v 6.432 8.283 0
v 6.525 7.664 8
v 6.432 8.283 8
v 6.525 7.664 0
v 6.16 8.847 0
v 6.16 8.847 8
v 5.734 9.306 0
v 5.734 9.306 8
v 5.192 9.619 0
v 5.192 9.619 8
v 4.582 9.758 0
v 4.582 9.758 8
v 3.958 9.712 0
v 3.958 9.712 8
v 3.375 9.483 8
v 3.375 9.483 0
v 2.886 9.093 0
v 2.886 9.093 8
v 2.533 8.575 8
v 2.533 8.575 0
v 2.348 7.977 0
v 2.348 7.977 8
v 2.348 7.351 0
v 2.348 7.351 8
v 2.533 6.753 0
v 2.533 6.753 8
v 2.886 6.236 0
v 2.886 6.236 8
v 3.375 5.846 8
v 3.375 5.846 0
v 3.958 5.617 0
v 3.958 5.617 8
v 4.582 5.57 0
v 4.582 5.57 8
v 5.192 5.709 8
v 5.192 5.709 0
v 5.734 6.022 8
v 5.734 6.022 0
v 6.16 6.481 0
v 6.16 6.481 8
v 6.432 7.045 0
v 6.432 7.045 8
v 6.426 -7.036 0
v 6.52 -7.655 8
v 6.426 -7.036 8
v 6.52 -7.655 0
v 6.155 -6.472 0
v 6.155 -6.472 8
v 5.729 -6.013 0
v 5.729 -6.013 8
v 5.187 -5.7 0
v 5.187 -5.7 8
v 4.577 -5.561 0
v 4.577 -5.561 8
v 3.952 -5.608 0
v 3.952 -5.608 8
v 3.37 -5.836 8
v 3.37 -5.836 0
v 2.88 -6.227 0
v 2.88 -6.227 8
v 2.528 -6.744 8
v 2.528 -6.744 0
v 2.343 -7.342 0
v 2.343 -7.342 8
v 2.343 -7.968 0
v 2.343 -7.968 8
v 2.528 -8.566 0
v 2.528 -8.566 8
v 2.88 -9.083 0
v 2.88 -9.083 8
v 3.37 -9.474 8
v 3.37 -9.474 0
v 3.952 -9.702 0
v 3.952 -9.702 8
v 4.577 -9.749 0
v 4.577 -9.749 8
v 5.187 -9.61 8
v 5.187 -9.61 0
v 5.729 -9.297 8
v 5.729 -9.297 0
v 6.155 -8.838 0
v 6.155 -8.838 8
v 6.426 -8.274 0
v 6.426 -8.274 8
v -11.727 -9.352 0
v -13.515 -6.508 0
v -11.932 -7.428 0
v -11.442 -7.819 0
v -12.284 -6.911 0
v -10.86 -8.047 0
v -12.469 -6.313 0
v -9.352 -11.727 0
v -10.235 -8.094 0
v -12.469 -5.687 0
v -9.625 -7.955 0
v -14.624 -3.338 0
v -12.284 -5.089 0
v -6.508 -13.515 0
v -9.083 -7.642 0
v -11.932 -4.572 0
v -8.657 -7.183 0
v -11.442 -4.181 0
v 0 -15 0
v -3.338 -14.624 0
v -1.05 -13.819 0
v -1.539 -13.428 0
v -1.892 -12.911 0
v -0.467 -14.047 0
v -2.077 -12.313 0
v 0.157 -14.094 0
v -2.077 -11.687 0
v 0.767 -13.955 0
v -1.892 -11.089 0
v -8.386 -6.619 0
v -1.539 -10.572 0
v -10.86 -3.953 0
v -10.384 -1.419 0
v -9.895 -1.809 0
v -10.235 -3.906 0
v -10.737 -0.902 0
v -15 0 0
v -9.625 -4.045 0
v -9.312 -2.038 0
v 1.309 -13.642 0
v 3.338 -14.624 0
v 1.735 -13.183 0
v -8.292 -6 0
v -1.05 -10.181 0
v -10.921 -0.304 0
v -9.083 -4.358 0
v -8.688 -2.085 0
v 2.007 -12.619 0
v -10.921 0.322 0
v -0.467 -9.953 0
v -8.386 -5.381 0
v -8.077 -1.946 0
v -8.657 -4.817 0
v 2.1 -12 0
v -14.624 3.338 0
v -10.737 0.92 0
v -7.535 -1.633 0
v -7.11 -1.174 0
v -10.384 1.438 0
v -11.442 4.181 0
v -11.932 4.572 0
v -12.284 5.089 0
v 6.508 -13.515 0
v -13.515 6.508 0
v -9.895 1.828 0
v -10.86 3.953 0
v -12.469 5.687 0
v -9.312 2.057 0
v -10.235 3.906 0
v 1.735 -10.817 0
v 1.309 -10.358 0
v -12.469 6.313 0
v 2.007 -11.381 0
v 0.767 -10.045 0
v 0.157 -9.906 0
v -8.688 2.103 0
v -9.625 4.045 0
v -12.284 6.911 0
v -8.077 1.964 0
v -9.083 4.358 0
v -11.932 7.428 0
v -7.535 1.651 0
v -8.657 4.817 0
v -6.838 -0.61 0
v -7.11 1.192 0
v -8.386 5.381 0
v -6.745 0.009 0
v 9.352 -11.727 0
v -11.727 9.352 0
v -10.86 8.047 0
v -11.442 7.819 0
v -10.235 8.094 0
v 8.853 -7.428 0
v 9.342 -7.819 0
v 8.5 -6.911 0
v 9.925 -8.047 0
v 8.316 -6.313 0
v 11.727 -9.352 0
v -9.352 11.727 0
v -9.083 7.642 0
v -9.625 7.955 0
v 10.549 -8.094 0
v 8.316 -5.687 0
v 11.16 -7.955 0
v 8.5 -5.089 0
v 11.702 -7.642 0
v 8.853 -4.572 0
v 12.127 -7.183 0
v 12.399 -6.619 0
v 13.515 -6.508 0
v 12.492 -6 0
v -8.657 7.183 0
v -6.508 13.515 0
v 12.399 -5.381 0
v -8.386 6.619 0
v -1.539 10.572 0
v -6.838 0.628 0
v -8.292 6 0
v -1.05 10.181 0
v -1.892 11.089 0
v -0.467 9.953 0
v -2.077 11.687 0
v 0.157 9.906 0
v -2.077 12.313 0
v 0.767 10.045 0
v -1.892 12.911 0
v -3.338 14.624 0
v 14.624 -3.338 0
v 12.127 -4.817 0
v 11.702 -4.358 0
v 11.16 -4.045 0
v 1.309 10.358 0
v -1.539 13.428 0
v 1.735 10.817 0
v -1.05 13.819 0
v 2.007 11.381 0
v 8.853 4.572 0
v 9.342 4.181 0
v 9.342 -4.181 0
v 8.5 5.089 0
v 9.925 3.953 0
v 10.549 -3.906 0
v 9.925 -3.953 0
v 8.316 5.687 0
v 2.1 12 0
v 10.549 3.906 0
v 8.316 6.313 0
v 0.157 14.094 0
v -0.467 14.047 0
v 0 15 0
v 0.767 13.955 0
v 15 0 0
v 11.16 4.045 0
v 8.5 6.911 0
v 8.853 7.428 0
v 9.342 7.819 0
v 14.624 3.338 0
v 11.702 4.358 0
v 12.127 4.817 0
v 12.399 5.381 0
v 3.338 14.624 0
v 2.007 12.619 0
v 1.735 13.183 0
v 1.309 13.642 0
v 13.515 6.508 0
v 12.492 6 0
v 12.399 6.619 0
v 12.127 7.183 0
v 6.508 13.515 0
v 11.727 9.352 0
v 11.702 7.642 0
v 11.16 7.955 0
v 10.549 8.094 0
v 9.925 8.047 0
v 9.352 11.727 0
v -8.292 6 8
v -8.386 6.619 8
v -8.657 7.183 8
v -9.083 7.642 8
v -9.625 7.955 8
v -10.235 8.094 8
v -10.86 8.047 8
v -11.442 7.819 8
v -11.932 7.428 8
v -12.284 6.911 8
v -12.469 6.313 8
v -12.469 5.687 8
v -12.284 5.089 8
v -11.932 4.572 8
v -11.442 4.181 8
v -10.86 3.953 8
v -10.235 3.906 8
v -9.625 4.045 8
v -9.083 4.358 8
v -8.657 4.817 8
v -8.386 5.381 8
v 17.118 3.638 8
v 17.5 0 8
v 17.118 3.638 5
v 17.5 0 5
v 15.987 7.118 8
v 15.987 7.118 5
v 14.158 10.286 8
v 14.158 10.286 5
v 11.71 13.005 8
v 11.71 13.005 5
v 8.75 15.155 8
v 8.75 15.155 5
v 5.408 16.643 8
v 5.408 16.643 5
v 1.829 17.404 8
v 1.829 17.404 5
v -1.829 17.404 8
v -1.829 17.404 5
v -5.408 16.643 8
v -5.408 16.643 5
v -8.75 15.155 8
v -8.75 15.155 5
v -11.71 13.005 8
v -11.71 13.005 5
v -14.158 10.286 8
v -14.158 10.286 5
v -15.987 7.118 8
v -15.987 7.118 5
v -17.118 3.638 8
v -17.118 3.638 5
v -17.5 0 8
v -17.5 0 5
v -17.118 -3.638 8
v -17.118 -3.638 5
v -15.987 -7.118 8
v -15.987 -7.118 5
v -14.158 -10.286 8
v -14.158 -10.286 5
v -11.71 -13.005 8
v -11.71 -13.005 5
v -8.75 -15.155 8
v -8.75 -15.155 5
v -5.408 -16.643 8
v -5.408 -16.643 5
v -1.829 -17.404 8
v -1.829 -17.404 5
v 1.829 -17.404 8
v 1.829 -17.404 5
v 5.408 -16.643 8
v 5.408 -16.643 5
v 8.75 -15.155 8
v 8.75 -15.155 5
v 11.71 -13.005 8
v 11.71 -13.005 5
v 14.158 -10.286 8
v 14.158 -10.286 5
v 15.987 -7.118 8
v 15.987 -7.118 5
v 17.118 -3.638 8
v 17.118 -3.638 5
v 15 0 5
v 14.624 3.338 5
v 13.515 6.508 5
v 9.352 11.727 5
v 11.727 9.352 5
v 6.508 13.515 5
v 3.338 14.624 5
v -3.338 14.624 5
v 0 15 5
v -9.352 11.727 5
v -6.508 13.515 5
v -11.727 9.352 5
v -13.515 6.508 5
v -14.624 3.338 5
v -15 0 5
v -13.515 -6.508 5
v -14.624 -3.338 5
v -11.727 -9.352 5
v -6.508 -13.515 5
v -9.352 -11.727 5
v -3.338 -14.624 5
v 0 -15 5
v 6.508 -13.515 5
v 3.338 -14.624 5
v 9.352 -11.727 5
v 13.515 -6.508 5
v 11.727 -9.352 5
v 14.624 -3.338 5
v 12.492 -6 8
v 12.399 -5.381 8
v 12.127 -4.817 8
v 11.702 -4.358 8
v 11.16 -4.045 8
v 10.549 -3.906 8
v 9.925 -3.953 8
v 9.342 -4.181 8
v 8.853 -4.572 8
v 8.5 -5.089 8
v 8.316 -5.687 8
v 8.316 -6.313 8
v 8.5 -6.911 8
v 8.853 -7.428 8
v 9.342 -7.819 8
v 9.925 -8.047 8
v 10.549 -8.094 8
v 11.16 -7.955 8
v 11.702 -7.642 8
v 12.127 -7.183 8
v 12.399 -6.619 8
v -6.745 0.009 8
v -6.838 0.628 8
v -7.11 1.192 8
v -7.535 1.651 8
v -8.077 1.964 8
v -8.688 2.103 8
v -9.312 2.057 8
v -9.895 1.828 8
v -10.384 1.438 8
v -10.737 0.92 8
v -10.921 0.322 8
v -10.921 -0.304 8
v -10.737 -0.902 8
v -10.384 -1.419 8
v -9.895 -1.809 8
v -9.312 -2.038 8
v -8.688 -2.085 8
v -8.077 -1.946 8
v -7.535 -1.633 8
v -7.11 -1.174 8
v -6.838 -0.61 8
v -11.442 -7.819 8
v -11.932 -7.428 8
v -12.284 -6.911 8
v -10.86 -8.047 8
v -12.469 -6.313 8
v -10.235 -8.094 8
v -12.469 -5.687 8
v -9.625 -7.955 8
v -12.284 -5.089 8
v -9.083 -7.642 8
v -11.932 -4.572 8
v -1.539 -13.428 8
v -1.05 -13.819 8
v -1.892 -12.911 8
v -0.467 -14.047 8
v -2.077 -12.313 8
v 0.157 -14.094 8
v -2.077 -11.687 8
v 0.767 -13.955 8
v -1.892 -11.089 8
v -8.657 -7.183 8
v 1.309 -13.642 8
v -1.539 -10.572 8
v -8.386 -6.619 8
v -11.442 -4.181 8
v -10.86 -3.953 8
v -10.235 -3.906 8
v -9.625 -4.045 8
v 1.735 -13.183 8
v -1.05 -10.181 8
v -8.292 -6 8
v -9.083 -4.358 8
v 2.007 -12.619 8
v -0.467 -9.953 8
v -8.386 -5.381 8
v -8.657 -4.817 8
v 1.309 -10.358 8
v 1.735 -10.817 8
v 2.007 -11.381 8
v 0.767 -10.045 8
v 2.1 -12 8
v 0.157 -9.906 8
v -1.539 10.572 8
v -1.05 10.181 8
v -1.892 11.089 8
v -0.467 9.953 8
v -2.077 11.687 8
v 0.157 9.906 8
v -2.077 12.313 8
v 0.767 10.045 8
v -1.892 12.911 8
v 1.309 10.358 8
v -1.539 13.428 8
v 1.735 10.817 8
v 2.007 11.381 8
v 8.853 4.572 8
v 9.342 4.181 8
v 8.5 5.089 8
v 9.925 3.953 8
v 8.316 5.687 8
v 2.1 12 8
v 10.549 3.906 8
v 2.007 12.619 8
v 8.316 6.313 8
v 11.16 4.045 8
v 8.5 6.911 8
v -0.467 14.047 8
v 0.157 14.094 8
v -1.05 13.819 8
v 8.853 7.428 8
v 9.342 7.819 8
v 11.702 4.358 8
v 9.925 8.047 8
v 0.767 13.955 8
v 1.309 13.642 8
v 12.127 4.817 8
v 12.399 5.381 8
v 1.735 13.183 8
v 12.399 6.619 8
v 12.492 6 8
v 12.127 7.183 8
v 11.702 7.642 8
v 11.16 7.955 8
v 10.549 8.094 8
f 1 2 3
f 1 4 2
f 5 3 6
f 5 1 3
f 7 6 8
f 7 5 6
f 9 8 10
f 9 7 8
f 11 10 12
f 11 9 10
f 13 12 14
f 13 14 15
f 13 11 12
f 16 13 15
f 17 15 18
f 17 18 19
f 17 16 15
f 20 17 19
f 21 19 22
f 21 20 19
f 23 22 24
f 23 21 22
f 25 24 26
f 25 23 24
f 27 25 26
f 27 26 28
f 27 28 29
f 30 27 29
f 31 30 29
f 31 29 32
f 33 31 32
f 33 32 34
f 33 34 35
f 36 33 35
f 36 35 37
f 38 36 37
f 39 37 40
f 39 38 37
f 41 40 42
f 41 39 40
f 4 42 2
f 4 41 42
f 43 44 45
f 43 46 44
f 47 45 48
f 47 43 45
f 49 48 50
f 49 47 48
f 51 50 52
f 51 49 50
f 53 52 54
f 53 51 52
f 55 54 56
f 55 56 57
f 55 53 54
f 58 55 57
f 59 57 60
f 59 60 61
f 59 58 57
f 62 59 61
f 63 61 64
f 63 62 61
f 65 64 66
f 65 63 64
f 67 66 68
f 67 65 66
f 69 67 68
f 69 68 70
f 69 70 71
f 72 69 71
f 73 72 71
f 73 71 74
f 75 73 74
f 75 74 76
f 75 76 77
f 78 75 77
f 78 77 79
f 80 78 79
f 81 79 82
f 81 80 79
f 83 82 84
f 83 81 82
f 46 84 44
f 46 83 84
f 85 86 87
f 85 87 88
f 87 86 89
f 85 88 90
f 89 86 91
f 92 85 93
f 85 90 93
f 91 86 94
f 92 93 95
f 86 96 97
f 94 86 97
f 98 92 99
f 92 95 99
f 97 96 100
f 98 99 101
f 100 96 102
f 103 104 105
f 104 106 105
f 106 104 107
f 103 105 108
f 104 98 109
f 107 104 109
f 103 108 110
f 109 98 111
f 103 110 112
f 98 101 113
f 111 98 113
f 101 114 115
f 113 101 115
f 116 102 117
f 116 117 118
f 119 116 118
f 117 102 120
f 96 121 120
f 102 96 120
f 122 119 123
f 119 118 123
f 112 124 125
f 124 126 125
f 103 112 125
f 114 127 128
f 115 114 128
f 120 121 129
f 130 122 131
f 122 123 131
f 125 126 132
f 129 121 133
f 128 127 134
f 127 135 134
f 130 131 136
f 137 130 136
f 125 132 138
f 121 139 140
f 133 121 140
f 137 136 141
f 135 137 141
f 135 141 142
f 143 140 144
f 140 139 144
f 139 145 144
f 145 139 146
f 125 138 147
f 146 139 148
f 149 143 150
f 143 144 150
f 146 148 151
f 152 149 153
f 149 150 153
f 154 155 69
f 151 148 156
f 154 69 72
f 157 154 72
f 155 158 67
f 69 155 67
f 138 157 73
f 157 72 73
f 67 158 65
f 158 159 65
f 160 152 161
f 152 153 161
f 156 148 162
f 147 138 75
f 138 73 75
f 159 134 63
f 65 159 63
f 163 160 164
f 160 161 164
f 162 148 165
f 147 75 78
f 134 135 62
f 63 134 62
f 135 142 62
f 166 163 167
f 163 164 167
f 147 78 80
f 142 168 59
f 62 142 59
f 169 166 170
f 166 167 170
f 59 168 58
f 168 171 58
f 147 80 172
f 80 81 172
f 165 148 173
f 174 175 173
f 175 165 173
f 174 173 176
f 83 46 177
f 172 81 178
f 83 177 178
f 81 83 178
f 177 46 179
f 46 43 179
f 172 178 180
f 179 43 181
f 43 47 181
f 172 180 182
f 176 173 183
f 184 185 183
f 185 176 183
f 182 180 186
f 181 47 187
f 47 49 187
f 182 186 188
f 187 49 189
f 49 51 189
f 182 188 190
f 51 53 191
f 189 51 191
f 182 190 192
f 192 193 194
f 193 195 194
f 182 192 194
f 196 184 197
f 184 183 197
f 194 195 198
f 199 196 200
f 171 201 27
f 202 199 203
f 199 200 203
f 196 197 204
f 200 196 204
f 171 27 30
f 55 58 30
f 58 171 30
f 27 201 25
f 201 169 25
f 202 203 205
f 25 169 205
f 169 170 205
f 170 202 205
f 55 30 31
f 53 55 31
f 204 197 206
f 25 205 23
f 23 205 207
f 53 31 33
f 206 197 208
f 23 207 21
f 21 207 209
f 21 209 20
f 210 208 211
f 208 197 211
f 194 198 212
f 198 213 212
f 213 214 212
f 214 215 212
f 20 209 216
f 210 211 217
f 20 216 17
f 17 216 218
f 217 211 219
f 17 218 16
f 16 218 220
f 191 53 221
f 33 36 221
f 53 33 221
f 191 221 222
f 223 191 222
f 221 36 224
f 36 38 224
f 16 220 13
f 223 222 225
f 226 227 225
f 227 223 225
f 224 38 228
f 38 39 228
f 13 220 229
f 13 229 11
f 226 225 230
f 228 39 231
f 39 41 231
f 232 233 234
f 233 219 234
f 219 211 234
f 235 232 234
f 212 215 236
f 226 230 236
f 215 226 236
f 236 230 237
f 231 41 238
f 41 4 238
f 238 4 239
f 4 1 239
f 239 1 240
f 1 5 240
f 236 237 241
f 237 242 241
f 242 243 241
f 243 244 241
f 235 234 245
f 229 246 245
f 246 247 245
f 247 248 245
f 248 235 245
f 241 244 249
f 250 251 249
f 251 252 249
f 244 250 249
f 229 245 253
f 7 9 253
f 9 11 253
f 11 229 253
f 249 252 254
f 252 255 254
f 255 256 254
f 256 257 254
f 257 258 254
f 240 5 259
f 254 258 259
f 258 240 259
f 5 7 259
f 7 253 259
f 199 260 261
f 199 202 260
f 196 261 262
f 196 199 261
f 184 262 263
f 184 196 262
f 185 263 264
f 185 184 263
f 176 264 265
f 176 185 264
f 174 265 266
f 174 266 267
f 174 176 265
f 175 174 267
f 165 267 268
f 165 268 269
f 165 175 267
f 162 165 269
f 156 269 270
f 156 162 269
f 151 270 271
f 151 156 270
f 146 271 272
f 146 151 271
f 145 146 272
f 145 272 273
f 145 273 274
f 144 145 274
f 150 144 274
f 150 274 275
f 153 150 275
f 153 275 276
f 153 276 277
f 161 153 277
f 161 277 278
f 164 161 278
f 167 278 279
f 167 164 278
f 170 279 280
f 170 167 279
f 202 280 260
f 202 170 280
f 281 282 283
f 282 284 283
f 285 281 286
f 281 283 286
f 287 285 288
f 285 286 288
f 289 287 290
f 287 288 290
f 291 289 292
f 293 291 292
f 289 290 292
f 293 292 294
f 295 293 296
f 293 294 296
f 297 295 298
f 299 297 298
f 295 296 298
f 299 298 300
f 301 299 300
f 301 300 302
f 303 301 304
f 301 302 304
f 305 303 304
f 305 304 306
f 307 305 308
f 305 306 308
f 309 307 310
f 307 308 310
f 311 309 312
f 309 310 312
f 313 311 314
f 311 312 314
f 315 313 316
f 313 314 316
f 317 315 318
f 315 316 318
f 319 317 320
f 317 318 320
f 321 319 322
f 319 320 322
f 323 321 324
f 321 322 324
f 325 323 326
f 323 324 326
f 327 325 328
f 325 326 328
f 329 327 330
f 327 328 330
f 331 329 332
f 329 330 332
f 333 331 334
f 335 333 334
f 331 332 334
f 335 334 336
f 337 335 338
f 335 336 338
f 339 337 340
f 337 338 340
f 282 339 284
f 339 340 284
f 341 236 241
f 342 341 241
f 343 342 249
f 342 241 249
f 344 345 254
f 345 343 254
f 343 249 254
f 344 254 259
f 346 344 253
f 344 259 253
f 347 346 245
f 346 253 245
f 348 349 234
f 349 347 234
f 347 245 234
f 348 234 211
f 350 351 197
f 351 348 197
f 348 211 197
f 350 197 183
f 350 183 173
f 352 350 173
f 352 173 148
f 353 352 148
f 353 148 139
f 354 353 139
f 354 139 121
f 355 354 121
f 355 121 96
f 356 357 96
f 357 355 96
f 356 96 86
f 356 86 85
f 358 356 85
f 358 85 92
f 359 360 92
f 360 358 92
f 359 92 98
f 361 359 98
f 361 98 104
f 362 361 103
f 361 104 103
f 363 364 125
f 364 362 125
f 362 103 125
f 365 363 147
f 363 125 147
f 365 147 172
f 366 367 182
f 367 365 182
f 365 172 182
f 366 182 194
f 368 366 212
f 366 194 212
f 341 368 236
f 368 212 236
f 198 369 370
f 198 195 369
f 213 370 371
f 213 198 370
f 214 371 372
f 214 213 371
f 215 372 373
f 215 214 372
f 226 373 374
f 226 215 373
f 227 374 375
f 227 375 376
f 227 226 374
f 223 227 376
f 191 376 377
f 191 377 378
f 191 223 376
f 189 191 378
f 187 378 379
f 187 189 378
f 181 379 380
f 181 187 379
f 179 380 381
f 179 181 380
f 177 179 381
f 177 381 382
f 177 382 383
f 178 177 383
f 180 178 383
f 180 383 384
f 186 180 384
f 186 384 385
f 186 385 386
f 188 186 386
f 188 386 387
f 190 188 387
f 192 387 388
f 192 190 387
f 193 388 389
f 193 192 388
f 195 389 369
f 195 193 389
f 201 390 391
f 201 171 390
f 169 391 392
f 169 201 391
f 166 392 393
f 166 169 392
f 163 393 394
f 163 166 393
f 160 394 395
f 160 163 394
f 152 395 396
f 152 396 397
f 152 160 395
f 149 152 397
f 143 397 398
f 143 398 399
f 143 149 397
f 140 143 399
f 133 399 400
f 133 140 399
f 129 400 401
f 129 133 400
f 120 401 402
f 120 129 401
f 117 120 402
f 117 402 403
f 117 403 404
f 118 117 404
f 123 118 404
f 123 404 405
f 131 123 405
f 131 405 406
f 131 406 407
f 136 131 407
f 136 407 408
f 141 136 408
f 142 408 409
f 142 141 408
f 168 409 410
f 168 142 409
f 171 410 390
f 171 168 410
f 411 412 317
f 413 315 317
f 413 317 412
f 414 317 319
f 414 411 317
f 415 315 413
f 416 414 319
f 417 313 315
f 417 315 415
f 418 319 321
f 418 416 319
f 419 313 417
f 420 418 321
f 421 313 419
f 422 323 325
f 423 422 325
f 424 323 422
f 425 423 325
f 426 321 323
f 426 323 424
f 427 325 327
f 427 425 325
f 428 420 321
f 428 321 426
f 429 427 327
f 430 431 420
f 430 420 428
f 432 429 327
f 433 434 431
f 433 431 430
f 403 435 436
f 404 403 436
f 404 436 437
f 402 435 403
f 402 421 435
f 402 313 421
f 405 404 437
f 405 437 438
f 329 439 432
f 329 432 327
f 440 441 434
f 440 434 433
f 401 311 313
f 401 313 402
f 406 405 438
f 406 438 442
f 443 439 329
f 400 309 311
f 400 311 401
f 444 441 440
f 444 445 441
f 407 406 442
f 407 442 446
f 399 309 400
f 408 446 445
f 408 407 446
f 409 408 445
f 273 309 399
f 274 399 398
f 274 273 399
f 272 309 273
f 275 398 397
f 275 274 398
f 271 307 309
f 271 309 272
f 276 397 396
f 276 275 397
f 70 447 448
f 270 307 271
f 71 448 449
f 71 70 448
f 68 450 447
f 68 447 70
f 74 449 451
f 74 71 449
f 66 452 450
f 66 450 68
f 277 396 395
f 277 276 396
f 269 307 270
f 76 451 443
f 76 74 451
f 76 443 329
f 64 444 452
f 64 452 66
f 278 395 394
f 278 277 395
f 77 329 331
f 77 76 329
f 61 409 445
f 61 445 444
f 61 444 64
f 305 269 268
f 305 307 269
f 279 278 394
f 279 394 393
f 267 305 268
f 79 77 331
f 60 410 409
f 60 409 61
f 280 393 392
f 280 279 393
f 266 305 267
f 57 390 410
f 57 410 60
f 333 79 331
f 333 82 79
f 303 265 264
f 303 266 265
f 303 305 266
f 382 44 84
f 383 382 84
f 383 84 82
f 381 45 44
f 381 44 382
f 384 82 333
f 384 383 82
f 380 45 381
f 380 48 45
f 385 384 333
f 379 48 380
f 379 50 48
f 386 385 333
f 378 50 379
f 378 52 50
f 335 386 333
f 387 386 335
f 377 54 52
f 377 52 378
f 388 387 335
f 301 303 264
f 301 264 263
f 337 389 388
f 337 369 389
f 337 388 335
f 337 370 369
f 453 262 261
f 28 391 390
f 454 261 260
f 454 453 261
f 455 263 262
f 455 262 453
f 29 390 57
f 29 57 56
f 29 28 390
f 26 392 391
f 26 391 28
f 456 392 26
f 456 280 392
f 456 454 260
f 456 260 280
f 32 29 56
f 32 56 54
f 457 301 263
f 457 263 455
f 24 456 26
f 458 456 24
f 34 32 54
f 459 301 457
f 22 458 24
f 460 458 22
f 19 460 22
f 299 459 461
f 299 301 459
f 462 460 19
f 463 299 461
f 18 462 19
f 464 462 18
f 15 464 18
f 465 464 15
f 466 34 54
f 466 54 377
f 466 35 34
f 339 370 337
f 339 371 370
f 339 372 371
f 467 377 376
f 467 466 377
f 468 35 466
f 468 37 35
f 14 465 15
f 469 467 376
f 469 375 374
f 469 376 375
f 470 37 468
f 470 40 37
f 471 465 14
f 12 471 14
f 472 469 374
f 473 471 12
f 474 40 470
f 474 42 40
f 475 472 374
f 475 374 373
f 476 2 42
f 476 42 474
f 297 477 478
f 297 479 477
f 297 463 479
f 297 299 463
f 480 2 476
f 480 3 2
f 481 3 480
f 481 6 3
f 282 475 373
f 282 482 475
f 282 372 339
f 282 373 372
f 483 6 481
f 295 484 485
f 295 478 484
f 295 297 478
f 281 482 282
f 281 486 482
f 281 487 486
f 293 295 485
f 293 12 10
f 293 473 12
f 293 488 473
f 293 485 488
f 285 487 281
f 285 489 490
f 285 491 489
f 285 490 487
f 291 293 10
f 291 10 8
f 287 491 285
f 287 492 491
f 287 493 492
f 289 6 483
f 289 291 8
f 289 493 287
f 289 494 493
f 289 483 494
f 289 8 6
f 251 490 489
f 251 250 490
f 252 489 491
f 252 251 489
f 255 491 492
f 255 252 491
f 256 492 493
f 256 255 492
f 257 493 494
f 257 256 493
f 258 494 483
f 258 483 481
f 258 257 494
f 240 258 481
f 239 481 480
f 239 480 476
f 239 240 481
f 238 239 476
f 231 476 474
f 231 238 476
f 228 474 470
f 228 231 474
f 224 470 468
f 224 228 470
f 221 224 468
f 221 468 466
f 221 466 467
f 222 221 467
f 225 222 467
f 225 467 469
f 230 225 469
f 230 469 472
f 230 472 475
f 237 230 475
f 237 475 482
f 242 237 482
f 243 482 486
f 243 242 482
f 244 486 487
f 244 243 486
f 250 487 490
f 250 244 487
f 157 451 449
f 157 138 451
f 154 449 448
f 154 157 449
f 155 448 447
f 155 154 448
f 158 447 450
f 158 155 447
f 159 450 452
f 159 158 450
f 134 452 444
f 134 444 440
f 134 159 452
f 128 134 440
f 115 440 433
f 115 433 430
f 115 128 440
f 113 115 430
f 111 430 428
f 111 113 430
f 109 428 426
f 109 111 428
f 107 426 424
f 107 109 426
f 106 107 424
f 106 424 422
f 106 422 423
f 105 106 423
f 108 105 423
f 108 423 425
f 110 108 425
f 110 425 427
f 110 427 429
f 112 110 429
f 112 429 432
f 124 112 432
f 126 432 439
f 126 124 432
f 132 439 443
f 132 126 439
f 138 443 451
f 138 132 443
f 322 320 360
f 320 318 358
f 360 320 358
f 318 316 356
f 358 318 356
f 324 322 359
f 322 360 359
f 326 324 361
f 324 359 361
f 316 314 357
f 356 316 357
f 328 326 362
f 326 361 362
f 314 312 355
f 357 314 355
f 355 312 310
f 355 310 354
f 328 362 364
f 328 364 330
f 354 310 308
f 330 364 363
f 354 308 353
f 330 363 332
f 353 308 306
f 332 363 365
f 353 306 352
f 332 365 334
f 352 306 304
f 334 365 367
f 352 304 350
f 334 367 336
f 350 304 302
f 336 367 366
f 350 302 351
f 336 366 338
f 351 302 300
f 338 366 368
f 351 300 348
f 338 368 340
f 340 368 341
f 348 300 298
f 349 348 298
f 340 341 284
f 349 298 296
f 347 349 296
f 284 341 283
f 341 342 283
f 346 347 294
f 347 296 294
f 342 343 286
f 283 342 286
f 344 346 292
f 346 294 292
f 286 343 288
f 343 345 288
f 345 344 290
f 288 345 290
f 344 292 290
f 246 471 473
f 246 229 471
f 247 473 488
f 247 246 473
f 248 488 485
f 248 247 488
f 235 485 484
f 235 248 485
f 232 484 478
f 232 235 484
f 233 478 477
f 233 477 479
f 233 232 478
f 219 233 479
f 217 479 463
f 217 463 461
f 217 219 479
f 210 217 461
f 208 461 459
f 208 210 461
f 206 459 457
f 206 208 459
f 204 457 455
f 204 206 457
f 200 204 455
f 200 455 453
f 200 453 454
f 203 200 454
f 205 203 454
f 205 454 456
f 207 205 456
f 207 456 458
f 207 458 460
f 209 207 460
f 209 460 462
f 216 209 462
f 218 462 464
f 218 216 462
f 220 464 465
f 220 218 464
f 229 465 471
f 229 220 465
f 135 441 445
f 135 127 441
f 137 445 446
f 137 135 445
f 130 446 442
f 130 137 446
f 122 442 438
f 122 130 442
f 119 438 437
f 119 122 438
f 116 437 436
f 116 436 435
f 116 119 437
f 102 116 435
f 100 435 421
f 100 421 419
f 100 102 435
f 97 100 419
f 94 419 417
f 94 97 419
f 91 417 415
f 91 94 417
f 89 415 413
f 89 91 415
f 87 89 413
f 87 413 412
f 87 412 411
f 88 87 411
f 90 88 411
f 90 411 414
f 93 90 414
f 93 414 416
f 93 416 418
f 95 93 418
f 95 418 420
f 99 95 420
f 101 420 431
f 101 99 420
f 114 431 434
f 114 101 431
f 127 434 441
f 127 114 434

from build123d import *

# Parameters (mm, degrees)
SKETCH_1_R      = 15
SKETCH_1_R_2    = 2.1
EXTRUDE_1_DEPTH = 7
EXTRUDE_START   = -2
SKETCH_2_R      = 17.5
SKETCH_2_R_2    = 2.1
EXTRUDE_2_DEPTH = 2
SKETCH_5_R      = 17.5
SKETCH_5_R_2    = 2.1
EXTRUDE_4_DEPTH = 1


with BuildPart() as part:
    # 草图1 → 凸台-拉伸1 (new body)
    with BuildSketch(Plane.XY):
        Circle(SKETCH_1_R)
        with Locations((0, 12)):
            Circle(SKETCH_1_R_2, mode=Mode.SUBTRACT)
        with Locations((10.392304845, 6)):
            Circle(SKETCH_1_R_2, mode=Mode.SUBTRACT)
        with Locations((10.392304845, -6)):
            Circle(SKETCH_1_R_2, mode=Mode.SUBTRACT)
        with Locations((0, -12)):
            Circle(SKETCH_1_R_2, mode=Mode.SUBTRACT)
        with Locations((-10.392304845, -6)):
            Circle(SKETCH_1_R_2, mode=Mode.SUBTRACT)
        with Locations((-10.392304845, 6)):
            Circle(SKETCH_1_R_2, mode=Mode.SUBTRACT)
        with Locations((4.425, 7.664324823)):
            Circle(SKETCH_1_R_2, mode=Mode.SUBTRACT)
        with Locations((4.419693866, -7.655134331)):
            Circle(SKETCH_1_R_2, mode=Mode.SUBTRACT)
        with Locations((-8.844693866, 0.009190493)):
            Circle(SKETCH_1_R_2, mode=Mode.SUBTRACT)
    extrude(amount=EXTRUDE_1_DEPTH)

    # 草图2 → 凸台-拉伸2 (add)
    with BuildSketch(Plane.XY.offset(7).offset(EXTRUDE_START)):
        Circle(SKETCH_2_R)
        with Locations((-8.844693866, 0.009190493)):
            Circle(SKETCH_2_R_2, mode=Mode.SUBTRACT)
        with Locations((-10.392304845, -6)):
            Circle(SKETCH_2_R_2, mode=Mode.SUBTRACT)
        with Locations((0, -12)):
            Circle(SKETCH_2_R_2, mode=Mode.SUBTRACT)
        with Locations((4.419693866, -7.655134331)):
            Circle(SKETCH_2_R_2, mode=Mode.SUBTRACT)
        with Locations((10.392304845, -6)):
            Circle(SKETCH_2_R_2, mode=Mode.SUBTRACT)
        with Locations((10.392304845, 6)):
            Circle(SKETCH_2_R_2, mode=Mode.SUBTRACT)
        with Locations((4.425, 7.664324823)):
            Circle(SKETCH_2_R_2, mode=Mode.SUBTRACT)
        with Locations((0, 12)):
            Circle(SKETCH_2_R_2, mode=Mode.SUBTRACT)
        with Locations((-10.392304845, 6)):
            Circle(SKETCH_2_R_2, mode=Mode.SUBTRACT)
    extrude(amount=EXTRUDE_2_DEPTH)

    # 草图5 → 凸台-拉伸4 (add)
    with BuildSketch(Plane.XY.offset(7)):
        Circle(SKETCH_5_R)
        with Locations((-10.392304845, -6)):
            Circle(SKETCH_5_R_2, mode=Mode.SUBTRACT)
        with Locations((0, -12)):
            Circle(SKETCH_5_R_2, mode=Mode.SUBTRACT)
        with Locations((4.419693866, -7.655134331)):
            Circle(SKETCH_5_R_2, mode=Mode.SUBTRACT)
        with Locations((10.392304845, -6)):
            Circle(SKETCH_5_R_2, mode=Mode.SUBTRACT)
        with Locations((10.392304845, 6)):
            Circle(SKETCH_5_R_2, mode=Mode.SUBTRACT)
        with Locations((4.425, 7.664324823)):
            Circle(SKETCH_5_R_2, mode=Mode.SUBTRACT)
        with Locations((0, 12)):
            Circle(SKETCH_5_R_2, mode=Mode.SUBTRACT)
        with Locations((-8.844693866, 0.009190493)):
            Circle(SKETCH_5_R_2, mode=Mode.SUBTRACT)
        with Locations((-10.392304845, 6)):
            Circle(SKETCH_5_R_2, mode=Mode.SUBTRACT)
    extrude(amount=EXTRUDE_4_DEPTH)


solid = part.part
